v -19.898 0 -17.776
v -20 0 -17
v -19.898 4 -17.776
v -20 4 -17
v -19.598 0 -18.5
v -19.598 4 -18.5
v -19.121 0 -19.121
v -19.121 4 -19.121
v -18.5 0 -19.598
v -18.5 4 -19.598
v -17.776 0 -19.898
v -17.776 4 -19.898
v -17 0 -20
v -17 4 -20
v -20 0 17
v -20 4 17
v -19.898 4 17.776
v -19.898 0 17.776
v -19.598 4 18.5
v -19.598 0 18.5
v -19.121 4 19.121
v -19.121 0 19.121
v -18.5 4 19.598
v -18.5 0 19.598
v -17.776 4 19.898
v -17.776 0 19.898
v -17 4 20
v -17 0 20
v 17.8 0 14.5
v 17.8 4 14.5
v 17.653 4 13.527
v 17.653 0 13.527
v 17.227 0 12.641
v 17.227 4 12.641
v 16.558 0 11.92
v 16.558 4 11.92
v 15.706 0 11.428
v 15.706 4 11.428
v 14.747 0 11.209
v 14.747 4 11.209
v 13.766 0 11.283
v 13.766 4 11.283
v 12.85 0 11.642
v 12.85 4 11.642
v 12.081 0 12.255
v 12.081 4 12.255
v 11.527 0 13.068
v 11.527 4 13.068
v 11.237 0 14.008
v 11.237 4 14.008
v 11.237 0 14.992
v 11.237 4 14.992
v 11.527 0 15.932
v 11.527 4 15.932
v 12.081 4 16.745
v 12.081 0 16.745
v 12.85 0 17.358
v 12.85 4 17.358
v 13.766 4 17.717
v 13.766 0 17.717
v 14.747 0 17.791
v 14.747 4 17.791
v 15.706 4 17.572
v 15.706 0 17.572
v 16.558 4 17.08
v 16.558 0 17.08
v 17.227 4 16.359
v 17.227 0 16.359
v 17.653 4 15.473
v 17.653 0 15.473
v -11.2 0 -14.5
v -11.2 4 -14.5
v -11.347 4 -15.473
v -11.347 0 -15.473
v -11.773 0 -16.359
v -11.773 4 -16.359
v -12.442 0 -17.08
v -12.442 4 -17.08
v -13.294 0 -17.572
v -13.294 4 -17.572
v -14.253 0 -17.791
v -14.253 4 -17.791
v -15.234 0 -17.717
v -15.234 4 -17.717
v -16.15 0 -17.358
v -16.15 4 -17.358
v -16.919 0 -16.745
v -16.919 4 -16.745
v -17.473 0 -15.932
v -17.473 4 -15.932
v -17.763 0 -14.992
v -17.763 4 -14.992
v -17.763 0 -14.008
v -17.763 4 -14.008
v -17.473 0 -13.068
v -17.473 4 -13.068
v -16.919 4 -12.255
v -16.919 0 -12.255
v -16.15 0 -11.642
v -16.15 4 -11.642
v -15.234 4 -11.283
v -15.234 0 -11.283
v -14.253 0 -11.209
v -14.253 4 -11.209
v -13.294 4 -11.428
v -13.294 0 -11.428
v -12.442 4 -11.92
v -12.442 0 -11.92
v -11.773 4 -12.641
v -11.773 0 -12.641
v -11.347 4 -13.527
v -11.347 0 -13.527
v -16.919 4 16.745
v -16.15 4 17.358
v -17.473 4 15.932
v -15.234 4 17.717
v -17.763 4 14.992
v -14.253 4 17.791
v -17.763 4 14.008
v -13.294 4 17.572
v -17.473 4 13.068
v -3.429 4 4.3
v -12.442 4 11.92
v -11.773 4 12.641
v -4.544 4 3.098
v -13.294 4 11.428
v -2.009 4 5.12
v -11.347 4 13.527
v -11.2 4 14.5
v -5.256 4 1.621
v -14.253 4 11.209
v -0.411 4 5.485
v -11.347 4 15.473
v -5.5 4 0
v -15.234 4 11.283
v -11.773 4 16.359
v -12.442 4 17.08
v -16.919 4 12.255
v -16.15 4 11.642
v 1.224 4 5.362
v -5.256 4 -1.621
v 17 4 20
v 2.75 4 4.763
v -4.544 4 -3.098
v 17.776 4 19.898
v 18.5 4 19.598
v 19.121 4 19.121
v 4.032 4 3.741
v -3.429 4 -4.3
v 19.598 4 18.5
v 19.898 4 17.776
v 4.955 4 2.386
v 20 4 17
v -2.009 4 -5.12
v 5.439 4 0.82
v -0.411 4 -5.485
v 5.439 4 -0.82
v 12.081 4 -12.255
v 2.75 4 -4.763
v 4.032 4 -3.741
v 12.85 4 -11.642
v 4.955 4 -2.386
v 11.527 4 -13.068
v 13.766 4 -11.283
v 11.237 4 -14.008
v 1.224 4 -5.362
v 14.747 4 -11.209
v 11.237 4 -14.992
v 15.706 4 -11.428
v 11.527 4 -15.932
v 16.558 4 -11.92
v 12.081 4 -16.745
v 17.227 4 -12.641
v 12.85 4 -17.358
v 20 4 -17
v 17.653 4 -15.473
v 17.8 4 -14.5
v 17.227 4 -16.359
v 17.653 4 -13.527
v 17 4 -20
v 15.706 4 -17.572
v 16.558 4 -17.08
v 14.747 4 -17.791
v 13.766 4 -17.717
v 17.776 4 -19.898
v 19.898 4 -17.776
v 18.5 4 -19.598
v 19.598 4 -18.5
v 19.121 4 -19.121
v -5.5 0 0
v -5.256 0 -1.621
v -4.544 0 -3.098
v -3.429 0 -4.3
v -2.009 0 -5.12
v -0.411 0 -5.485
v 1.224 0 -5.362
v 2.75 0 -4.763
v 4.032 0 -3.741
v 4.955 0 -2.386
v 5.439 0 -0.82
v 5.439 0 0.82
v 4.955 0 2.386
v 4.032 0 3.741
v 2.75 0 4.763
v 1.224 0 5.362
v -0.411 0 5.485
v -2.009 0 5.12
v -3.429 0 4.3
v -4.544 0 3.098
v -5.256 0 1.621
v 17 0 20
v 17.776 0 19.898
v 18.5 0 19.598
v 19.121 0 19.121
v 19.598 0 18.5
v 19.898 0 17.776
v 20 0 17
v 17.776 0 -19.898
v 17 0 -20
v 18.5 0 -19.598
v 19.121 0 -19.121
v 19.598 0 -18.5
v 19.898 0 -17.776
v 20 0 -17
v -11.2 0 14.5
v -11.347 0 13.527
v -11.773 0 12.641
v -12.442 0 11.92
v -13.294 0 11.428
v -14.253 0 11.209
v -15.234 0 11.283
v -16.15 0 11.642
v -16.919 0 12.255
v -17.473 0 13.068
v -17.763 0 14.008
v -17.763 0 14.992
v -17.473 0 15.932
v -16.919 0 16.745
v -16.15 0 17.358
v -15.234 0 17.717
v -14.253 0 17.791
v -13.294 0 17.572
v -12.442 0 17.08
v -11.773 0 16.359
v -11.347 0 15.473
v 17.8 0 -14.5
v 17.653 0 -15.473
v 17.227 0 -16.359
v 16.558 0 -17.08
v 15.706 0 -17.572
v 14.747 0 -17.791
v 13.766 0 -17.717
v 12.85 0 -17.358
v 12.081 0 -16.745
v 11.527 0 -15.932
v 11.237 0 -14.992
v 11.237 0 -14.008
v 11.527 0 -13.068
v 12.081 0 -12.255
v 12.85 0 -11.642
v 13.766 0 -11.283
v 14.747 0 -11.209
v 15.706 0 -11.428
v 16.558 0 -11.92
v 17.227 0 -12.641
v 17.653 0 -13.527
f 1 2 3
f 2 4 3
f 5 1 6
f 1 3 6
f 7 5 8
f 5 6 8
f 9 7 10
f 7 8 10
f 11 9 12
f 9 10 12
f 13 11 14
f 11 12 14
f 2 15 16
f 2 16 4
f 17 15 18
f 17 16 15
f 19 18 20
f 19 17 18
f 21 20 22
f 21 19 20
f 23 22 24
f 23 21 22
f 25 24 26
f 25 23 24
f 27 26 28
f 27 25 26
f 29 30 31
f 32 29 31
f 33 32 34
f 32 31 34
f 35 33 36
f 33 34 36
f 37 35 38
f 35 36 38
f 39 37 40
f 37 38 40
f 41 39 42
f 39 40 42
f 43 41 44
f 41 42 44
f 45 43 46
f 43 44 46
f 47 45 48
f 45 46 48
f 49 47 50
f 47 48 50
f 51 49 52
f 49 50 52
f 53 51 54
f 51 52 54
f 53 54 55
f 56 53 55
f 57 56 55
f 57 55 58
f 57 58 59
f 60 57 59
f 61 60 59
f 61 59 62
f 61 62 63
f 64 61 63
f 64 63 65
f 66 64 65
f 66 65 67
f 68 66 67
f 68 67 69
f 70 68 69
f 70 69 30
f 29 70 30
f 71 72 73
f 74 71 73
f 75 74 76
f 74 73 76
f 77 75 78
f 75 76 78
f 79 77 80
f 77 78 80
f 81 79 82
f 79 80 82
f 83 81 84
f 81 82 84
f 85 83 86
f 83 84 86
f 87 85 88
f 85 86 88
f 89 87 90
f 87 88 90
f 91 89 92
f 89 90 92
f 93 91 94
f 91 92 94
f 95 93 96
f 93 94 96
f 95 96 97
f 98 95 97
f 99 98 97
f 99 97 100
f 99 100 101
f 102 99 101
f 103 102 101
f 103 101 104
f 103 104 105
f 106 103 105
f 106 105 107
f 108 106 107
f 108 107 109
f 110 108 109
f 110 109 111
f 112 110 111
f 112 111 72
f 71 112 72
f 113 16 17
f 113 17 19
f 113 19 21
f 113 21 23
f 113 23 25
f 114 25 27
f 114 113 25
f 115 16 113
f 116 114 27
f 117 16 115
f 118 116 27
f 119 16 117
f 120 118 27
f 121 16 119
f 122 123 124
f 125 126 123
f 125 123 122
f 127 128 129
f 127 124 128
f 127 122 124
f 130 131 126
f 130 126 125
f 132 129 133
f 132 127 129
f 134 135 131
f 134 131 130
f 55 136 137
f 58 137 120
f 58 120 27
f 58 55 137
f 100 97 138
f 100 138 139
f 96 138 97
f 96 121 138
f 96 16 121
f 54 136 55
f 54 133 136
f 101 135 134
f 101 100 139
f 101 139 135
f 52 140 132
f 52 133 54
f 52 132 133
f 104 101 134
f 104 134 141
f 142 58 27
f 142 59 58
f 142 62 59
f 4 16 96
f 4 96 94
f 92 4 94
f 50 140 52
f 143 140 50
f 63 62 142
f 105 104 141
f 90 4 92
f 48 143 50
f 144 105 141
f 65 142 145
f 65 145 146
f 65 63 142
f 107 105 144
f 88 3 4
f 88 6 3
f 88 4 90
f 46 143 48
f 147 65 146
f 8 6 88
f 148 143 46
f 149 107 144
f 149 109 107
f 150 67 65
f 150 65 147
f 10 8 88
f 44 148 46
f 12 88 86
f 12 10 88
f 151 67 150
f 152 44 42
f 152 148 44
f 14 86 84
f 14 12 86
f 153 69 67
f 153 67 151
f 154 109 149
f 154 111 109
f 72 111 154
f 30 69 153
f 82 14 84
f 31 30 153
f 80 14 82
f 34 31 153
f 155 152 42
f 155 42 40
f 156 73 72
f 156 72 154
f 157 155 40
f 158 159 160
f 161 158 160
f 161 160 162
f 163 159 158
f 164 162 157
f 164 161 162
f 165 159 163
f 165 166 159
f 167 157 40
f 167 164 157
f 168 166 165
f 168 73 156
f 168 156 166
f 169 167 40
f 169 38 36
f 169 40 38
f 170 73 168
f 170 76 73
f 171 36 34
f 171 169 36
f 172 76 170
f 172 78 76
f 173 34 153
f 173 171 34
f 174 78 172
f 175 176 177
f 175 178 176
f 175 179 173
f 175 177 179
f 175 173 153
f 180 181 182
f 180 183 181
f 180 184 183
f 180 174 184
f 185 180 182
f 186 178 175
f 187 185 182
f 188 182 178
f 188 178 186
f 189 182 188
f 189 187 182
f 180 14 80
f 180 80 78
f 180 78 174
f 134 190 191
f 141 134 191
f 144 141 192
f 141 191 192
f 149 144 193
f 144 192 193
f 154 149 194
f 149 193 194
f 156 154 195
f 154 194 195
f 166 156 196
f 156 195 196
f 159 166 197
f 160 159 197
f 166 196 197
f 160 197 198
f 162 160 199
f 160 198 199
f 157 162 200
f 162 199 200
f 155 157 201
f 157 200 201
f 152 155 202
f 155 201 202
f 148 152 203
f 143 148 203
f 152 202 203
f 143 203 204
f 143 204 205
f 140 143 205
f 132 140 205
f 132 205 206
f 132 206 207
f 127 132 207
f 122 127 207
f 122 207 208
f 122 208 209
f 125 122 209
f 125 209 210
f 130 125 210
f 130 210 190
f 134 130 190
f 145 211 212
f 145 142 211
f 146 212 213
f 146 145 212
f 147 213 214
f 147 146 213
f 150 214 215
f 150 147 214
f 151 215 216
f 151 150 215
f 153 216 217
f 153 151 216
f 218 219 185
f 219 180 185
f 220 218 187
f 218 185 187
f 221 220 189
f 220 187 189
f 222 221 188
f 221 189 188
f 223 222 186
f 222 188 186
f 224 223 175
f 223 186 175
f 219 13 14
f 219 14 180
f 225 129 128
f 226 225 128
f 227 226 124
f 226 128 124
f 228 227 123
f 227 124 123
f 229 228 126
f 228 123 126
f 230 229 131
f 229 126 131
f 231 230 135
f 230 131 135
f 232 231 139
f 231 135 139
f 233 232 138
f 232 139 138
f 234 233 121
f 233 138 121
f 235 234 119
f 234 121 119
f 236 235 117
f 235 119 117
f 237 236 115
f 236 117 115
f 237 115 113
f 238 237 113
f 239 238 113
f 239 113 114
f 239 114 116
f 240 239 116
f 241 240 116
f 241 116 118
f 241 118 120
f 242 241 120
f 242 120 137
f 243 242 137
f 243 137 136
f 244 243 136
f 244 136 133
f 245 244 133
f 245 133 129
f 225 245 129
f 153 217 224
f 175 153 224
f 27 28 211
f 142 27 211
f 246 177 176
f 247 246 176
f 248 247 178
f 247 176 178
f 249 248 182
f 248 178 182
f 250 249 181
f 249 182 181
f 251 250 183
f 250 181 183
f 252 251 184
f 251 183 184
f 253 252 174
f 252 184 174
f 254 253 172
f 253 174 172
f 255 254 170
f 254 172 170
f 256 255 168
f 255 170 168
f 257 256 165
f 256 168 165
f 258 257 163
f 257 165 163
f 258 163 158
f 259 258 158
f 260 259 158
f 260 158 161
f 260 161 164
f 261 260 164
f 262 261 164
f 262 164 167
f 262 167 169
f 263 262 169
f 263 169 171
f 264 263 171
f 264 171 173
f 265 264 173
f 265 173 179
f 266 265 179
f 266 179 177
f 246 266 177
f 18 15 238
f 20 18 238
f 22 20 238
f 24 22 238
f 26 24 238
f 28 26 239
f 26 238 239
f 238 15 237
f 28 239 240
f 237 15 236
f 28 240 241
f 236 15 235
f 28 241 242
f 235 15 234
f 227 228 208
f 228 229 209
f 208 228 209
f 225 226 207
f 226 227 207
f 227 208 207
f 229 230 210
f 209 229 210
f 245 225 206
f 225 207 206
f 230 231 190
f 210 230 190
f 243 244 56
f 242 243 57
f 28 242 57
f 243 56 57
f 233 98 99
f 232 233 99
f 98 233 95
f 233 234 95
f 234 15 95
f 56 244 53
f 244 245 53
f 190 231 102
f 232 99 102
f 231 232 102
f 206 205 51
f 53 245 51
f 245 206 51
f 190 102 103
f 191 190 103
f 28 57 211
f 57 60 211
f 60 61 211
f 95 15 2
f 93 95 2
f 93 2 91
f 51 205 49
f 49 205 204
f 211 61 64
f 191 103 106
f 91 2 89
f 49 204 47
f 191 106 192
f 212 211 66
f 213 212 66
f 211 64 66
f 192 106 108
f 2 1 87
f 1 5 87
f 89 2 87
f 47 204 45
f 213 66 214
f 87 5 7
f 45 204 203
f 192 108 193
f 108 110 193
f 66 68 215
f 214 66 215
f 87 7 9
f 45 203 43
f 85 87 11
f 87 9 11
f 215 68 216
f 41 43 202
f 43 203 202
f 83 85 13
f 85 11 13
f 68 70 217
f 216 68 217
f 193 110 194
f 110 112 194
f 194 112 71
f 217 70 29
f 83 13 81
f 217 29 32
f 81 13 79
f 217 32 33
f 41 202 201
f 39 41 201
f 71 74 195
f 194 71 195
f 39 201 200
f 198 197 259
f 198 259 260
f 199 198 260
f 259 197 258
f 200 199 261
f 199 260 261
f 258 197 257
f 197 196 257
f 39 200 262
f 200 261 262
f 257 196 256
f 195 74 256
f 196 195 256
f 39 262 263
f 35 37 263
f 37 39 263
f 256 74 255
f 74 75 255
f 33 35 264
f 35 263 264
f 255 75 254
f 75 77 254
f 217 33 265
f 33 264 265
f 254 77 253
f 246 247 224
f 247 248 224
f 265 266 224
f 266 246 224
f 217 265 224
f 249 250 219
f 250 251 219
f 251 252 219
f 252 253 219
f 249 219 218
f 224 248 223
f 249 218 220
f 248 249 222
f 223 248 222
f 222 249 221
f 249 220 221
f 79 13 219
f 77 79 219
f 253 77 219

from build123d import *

# Parameters (mm, degrees)
SKETCH_1_W         = 40
SKETCH_1_H         = 40
EXTRUDE_1_DEPTH    = 4
HOLE_WIZARD_M101_D = 11
FILLET_1_R         = 3
HOLE_WIZARD_M61_D  = 6.6


with BuildPart() as part:
    # Эскиз1 → Бобышка-Вытянуть1 (new body)
    with BuildSketch(Plane(origin=(0, 0, 0), x_dir=(1, 0, 0), z_dir=(0, 1, 0))):
        Rectangle(SKETCH_1_W, SKETCH_1_H)
    extrude(amount=EXTRUDE_1_DEPTH)

    # Отверстие с зазором M101 (through all)
    with Locations(Plane(origin=(0, 4, 0), x_dir=(1, 0, 0), z_dir=(0, 1, 0))):
        with Locations((0, 0)):
            Hole(HOLE_WIZARD_M101_D / 2)

    # Скругление1
    fillet_1_edges = [part.edges().sort_by_distance(p)[0] for p in [
        (20, 2, 20),
        (-20, 2, 20),
        (-20, 2, -20),
        (20, 2, -20),
    ]]
    fillet(fillet_1_edges, radius=FILLET_1_R)

    # Отверстие с зазором M61 (through all)
    with Locations(Plane(origin=(0, 0, 0), x_dir=(-1, 0, 0), z_dir=(0, -1, 0))):
        with Locations((-14.5, 14.5), (0, 0), (14.5, 14.5), (-14.5, -14.5), (14.5, -14.5)):
            Hole(HOLE_WIZARD_M61_D / 2)


solid = part.part
